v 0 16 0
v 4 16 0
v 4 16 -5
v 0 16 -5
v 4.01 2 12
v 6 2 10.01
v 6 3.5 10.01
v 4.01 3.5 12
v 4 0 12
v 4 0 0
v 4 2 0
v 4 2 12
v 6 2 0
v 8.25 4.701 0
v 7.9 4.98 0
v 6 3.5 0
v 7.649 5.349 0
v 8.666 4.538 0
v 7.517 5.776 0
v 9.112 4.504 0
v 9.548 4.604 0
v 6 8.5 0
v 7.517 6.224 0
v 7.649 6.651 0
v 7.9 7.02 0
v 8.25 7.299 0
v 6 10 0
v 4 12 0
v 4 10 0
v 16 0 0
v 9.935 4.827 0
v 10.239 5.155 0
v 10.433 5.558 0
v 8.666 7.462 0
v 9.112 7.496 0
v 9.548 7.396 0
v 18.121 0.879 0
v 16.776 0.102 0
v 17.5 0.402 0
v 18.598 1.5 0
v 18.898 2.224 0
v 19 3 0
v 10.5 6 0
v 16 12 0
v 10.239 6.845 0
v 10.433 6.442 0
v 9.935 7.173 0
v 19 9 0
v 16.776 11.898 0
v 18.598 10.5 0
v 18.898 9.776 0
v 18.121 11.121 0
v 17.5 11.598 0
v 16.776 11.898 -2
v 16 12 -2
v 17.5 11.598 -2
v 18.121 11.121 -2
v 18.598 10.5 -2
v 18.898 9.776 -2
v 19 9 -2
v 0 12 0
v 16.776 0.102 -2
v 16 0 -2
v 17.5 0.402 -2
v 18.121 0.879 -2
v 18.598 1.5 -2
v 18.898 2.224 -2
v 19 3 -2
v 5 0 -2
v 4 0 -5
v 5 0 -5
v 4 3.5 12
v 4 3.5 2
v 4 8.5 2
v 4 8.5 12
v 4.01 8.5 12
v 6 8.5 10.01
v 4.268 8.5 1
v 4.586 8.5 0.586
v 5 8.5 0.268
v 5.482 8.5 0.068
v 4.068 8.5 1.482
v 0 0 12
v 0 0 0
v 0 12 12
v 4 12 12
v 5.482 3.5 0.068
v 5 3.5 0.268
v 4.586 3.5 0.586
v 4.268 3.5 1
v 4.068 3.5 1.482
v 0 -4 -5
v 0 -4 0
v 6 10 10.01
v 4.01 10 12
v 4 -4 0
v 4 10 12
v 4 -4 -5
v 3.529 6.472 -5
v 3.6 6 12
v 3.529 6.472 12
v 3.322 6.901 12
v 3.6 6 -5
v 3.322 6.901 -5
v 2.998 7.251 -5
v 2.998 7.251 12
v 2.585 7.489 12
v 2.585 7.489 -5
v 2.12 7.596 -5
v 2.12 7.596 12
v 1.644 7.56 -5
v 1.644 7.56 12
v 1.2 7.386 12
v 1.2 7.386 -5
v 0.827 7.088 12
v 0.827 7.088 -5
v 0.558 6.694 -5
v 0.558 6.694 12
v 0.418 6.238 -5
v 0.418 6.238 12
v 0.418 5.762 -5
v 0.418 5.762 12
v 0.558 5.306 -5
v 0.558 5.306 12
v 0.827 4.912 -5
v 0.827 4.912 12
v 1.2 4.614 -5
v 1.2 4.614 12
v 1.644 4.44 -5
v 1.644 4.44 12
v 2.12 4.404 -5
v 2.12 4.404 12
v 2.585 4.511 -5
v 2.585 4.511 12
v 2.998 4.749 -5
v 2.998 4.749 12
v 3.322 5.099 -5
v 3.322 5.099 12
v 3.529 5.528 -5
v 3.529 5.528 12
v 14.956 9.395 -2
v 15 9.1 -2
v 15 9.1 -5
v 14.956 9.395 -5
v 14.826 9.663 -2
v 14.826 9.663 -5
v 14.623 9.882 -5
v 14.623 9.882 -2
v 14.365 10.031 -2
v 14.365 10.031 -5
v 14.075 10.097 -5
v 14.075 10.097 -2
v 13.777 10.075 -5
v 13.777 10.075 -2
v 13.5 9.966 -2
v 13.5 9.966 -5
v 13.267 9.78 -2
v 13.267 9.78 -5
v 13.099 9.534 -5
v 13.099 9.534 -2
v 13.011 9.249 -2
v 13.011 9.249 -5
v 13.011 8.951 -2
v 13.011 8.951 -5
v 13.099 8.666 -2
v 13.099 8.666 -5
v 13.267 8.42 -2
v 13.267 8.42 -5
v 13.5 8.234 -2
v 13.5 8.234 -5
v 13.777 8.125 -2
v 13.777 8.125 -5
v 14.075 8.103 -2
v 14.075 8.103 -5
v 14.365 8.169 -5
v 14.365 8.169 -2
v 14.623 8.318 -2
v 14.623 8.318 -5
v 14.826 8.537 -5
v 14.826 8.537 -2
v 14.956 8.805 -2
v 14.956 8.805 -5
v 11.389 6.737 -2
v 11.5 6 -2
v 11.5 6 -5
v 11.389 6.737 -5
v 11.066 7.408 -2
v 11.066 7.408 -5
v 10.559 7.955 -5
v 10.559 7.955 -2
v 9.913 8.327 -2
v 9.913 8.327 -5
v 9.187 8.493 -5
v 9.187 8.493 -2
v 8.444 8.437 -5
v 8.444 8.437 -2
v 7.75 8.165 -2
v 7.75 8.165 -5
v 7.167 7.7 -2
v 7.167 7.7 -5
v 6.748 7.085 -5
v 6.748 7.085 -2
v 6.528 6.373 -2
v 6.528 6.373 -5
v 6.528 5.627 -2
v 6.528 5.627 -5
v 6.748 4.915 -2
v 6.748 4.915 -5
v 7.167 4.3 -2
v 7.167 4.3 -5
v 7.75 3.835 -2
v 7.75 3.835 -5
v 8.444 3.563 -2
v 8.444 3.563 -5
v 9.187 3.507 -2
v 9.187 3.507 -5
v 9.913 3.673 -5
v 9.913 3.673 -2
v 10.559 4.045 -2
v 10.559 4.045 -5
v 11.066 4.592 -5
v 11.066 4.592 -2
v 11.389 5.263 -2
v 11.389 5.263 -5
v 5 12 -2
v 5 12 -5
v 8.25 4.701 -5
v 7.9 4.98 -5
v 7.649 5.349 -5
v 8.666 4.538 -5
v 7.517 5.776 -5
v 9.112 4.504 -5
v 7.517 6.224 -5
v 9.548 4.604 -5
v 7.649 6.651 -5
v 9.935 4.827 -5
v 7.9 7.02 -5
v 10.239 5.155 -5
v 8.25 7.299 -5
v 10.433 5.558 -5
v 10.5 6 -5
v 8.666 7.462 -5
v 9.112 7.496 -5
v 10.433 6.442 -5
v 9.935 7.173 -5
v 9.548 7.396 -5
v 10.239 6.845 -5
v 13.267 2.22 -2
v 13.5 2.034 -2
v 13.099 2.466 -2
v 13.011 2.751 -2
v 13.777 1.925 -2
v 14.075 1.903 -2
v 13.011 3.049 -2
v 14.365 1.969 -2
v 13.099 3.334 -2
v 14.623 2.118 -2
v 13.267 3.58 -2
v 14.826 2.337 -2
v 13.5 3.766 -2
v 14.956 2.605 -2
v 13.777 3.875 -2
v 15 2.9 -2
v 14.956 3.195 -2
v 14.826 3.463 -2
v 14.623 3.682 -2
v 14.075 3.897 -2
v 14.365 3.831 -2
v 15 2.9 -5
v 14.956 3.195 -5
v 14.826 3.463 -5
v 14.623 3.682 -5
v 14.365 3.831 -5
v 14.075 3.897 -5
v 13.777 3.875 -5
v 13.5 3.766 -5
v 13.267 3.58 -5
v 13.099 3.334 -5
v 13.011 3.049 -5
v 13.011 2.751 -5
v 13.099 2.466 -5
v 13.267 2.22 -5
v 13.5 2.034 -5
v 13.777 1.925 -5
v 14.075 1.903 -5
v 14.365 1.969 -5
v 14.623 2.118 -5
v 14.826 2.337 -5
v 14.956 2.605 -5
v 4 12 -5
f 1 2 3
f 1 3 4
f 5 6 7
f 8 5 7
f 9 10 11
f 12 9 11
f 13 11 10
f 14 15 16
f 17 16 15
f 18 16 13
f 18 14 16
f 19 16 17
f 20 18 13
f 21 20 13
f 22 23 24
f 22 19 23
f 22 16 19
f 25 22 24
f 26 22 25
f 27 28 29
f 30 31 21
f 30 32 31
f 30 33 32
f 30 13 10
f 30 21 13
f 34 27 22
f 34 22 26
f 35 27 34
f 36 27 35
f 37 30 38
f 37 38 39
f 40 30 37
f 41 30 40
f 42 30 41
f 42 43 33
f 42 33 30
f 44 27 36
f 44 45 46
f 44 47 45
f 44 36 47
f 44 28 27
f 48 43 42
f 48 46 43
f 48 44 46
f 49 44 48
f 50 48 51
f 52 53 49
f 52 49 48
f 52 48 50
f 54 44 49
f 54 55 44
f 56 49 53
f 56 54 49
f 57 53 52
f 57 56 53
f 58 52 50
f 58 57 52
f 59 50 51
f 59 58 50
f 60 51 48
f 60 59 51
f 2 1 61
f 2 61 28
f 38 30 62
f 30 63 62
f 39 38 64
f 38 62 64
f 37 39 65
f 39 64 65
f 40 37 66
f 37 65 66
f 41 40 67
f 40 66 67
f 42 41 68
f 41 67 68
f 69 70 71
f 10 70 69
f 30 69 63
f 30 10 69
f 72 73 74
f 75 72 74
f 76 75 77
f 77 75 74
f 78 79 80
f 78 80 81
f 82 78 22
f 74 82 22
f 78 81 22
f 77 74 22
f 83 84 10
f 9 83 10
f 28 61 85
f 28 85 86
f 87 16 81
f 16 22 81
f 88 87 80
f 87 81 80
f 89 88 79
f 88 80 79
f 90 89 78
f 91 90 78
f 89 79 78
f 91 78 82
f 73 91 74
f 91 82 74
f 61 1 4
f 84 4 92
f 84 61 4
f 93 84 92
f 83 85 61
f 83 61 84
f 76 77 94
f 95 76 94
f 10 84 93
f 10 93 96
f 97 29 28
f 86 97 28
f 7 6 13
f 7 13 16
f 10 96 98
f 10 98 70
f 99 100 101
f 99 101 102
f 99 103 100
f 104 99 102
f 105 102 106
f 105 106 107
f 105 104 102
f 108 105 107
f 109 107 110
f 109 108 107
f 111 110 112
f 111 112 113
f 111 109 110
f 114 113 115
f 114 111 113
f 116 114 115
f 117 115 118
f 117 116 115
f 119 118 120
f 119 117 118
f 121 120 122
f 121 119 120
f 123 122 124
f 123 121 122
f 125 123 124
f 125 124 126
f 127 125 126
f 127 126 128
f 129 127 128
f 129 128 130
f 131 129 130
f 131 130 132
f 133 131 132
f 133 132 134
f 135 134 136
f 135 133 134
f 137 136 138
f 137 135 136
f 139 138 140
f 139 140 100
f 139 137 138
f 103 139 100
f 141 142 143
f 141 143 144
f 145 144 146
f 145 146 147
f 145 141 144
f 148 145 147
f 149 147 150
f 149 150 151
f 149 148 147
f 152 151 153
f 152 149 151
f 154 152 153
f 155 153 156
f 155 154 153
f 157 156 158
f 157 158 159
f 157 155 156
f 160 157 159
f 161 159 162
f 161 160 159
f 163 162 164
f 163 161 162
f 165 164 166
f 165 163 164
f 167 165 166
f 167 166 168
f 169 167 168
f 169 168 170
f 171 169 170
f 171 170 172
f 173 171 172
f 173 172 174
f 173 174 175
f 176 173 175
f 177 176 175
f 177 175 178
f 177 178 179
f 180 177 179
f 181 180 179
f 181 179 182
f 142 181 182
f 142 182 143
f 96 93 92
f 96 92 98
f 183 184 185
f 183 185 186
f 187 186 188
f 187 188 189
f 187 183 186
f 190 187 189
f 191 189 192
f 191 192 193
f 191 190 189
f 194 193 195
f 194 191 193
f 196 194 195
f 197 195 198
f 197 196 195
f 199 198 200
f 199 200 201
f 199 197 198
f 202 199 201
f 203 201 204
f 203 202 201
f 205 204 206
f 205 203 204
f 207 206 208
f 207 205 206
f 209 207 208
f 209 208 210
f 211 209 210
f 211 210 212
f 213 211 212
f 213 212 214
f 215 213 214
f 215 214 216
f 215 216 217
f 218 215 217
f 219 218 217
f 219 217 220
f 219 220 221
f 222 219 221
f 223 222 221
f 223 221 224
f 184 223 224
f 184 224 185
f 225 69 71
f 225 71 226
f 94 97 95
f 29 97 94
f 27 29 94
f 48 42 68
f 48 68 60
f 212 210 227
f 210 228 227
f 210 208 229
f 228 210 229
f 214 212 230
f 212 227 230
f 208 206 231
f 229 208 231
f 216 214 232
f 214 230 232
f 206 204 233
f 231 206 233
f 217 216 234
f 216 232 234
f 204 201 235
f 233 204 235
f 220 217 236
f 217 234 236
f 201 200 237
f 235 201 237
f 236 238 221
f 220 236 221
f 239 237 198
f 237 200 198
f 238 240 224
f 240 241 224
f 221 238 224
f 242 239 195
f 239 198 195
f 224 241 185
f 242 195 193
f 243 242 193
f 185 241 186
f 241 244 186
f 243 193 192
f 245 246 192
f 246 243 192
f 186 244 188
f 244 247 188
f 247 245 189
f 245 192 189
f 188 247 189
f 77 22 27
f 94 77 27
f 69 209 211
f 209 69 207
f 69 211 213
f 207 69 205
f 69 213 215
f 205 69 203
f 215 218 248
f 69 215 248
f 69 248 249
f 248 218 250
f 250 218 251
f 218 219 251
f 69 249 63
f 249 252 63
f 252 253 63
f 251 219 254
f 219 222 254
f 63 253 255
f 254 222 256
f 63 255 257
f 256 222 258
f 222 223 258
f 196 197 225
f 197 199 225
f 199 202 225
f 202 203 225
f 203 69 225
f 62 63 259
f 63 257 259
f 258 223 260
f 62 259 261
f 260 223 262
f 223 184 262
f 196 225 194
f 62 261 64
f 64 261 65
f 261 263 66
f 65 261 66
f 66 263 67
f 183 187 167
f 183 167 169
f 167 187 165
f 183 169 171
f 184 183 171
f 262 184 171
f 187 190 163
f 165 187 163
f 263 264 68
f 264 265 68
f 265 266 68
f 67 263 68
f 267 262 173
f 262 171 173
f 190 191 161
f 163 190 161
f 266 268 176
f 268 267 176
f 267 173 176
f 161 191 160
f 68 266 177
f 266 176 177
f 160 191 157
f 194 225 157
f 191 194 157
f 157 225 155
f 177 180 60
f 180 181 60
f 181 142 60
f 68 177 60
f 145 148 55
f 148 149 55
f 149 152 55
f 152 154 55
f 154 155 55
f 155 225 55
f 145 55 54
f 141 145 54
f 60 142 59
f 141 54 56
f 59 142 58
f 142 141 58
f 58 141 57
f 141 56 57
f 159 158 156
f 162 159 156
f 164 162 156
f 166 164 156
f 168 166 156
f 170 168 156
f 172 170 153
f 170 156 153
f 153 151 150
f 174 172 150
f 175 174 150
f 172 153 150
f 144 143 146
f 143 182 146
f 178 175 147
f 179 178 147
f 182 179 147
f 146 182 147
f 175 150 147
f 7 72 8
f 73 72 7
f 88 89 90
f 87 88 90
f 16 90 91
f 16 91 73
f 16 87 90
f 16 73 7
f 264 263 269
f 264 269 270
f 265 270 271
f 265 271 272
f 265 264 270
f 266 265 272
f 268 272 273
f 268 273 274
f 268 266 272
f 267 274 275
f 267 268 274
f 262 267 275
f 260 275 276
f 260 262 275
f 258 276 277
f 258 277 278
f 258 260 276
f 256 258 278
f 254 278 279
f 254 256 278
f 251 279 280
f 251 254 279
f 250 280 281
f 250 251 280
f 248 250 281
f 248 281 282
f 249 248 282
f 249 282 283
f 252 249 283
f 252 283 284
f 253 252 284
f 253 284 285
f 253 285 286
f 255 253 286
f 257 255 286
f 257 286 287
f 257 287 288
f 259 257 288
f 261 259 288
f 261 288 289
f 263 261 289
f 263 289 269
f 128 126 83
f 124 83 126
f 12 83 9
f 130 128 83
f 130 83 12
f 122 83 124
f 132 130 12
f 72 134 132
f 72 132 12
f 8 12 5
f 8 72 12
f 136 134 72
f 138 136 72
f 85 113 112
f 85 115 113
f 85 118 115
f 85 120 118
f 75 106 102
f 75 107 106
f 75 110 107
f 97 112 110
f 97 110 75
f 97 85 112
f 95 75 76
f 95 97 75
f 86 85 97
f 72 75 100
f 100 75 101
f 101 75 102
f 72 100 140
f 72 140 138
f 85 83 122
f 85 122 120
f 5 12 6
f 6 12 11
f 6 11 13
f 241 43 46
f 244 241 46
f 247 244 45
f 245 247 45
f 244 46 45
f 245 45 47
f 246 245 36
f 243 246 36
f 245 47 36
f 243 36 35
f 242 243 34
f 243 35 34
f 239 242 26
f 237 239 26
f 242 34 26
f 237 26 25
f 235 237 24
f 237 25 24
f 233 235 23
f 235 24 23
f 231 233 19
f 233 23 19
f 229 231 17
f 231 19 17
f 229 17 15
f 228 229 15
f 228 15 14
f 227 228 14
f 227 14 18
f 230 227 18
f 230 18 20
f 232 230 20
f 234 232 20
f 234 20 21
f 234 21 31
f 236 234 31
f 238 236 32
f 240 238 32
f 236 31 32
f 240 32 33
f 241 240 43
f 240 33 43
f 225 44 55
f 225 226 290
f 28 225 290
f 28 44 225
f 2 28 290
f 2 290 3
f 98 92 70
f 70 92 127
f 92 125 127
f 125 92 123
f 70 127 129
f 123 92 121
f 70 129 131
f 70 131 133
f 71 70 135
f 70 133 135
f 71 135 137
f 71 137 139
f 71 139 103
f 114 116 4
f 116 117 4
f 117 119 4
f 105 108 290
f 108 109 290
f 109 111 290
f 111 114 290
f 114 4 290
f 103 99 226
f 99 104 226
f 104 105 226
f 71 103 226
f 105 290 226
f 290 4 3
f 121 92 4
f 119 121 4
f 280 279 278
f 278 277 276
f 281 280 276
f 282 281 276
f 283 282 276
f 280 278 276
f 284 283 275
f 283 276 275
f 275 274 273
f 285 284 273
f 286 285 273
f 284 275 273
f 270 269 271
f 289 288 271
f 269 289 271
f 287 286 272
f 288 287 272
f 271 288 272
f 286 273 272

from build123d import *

# Parameters (mm, degrees)
SKETCH_W      = 4
SKETCH_H      = 12
SKETCH_R      = 1.6
PAD_DEPTH     = 12
SKETCH001_R   = 1.6
SKETCH001_R_2 = 1.5
PAD001_DEPTH  = 5
SKETCH002_W   = 14
SKETCH002_H   = 12
SKETCH002_R   = 1
SKETCH002_R_2 = 2.5
POCKET_DEPTH  = 3.001
SKETCH003_W   = 2
SKETCH003_H   = 1.5
PAD002_DEPTH  = 12
CHAMFER_SIZE  = 1.99
FILLET002_R   = 2
FILLET_R      = 3


with BuildPart() as part:
    # Sketch → Pad (new body)
    with BuildSketch(Plane.XY):
        with Locations((2, 6)):
            Rectangle(SKETCH_W, SKETCH_H)
        with Locations((2, 6)):
            Circle(SKETCH_R, mode=Mode.SUBTRACT)
    extrude(amount=PAD_DEPTH)

    # Sketch001 → Pad001 (join)
    with BuildSketch(Plane.XY):
        Polygon((0, -4), (4, -4), (4, 0), (19, 0), (19, 12), (4, 12), (4, 16), (0, 16), align=None)
        with Locations((2, 6)):
            Circle(SKETCH001_R, mode=Mode.SUBTRACT)
        with Locations((9, 6)):
            Circle(SKETCH001_R_2, mode=Mode.SUBTRACT)
    extrude(amount=-PAD001_DEPTH)

    # Sketch002 (on DatumPlane) → Pocket (cut, through all)
    with BuildSketch(Plane.XY.offset(-2)):
        with Locations((12, 6)):
            Rectangle(SKETCH002_W, SKETCH002_H)
        with Locations((14, 9.1)):
            Circle(SKETCH002_R, mode=Mode.SUBTRACT)
        with Locations((14, 2.9)):
            Circle(SKETCH002_R, mode=Mode.SUBTRACT)
        with Locations((9, 6)):
            Circle(SKETCH002_R_2, mode=Mode.SUBTRACT)
    extrude(amount=-POCKET_DEPTH, mode=Mode.SUBTRACT)

    # Sketch003 → Pad002 (join)
    with BuildSketch(Plane.XY):
        with Locations((5, 9.25)):
            Rectangle(SKETCH003_W, SKETCH003_H)
        with Locations((5, 2.75)):
            Rectangle(SKETCH003_W, SKETCH003_H)
    extrude(amount=PAD002_DEPTH)

    # Chamfer
    chamfer_edges = [part.edges().sort_by_distance(p)[0] for p in [
        (6, 2.75, 12),
        (6, 9.25, 12),
    ]]
    chamfer(chamfer_edges, length=CHAMFER_SIZE)

    # Fillet002
    fillet002_edges = [part.edges().sort_by_distance(p)[0] for p in [
        (4, 6, 0),
    ]]
    fillet(fillet002_edges, radius=FILLET002_R)

    # Fillet
    fillet_edges = [part.edges().sort_by_distance(p)[0] for p in [
        (19, 0, -1),
        (19, 12, -1),
    ]]
    fillet(fillet_edges, radius=FILLET_R)


solid = part.part
